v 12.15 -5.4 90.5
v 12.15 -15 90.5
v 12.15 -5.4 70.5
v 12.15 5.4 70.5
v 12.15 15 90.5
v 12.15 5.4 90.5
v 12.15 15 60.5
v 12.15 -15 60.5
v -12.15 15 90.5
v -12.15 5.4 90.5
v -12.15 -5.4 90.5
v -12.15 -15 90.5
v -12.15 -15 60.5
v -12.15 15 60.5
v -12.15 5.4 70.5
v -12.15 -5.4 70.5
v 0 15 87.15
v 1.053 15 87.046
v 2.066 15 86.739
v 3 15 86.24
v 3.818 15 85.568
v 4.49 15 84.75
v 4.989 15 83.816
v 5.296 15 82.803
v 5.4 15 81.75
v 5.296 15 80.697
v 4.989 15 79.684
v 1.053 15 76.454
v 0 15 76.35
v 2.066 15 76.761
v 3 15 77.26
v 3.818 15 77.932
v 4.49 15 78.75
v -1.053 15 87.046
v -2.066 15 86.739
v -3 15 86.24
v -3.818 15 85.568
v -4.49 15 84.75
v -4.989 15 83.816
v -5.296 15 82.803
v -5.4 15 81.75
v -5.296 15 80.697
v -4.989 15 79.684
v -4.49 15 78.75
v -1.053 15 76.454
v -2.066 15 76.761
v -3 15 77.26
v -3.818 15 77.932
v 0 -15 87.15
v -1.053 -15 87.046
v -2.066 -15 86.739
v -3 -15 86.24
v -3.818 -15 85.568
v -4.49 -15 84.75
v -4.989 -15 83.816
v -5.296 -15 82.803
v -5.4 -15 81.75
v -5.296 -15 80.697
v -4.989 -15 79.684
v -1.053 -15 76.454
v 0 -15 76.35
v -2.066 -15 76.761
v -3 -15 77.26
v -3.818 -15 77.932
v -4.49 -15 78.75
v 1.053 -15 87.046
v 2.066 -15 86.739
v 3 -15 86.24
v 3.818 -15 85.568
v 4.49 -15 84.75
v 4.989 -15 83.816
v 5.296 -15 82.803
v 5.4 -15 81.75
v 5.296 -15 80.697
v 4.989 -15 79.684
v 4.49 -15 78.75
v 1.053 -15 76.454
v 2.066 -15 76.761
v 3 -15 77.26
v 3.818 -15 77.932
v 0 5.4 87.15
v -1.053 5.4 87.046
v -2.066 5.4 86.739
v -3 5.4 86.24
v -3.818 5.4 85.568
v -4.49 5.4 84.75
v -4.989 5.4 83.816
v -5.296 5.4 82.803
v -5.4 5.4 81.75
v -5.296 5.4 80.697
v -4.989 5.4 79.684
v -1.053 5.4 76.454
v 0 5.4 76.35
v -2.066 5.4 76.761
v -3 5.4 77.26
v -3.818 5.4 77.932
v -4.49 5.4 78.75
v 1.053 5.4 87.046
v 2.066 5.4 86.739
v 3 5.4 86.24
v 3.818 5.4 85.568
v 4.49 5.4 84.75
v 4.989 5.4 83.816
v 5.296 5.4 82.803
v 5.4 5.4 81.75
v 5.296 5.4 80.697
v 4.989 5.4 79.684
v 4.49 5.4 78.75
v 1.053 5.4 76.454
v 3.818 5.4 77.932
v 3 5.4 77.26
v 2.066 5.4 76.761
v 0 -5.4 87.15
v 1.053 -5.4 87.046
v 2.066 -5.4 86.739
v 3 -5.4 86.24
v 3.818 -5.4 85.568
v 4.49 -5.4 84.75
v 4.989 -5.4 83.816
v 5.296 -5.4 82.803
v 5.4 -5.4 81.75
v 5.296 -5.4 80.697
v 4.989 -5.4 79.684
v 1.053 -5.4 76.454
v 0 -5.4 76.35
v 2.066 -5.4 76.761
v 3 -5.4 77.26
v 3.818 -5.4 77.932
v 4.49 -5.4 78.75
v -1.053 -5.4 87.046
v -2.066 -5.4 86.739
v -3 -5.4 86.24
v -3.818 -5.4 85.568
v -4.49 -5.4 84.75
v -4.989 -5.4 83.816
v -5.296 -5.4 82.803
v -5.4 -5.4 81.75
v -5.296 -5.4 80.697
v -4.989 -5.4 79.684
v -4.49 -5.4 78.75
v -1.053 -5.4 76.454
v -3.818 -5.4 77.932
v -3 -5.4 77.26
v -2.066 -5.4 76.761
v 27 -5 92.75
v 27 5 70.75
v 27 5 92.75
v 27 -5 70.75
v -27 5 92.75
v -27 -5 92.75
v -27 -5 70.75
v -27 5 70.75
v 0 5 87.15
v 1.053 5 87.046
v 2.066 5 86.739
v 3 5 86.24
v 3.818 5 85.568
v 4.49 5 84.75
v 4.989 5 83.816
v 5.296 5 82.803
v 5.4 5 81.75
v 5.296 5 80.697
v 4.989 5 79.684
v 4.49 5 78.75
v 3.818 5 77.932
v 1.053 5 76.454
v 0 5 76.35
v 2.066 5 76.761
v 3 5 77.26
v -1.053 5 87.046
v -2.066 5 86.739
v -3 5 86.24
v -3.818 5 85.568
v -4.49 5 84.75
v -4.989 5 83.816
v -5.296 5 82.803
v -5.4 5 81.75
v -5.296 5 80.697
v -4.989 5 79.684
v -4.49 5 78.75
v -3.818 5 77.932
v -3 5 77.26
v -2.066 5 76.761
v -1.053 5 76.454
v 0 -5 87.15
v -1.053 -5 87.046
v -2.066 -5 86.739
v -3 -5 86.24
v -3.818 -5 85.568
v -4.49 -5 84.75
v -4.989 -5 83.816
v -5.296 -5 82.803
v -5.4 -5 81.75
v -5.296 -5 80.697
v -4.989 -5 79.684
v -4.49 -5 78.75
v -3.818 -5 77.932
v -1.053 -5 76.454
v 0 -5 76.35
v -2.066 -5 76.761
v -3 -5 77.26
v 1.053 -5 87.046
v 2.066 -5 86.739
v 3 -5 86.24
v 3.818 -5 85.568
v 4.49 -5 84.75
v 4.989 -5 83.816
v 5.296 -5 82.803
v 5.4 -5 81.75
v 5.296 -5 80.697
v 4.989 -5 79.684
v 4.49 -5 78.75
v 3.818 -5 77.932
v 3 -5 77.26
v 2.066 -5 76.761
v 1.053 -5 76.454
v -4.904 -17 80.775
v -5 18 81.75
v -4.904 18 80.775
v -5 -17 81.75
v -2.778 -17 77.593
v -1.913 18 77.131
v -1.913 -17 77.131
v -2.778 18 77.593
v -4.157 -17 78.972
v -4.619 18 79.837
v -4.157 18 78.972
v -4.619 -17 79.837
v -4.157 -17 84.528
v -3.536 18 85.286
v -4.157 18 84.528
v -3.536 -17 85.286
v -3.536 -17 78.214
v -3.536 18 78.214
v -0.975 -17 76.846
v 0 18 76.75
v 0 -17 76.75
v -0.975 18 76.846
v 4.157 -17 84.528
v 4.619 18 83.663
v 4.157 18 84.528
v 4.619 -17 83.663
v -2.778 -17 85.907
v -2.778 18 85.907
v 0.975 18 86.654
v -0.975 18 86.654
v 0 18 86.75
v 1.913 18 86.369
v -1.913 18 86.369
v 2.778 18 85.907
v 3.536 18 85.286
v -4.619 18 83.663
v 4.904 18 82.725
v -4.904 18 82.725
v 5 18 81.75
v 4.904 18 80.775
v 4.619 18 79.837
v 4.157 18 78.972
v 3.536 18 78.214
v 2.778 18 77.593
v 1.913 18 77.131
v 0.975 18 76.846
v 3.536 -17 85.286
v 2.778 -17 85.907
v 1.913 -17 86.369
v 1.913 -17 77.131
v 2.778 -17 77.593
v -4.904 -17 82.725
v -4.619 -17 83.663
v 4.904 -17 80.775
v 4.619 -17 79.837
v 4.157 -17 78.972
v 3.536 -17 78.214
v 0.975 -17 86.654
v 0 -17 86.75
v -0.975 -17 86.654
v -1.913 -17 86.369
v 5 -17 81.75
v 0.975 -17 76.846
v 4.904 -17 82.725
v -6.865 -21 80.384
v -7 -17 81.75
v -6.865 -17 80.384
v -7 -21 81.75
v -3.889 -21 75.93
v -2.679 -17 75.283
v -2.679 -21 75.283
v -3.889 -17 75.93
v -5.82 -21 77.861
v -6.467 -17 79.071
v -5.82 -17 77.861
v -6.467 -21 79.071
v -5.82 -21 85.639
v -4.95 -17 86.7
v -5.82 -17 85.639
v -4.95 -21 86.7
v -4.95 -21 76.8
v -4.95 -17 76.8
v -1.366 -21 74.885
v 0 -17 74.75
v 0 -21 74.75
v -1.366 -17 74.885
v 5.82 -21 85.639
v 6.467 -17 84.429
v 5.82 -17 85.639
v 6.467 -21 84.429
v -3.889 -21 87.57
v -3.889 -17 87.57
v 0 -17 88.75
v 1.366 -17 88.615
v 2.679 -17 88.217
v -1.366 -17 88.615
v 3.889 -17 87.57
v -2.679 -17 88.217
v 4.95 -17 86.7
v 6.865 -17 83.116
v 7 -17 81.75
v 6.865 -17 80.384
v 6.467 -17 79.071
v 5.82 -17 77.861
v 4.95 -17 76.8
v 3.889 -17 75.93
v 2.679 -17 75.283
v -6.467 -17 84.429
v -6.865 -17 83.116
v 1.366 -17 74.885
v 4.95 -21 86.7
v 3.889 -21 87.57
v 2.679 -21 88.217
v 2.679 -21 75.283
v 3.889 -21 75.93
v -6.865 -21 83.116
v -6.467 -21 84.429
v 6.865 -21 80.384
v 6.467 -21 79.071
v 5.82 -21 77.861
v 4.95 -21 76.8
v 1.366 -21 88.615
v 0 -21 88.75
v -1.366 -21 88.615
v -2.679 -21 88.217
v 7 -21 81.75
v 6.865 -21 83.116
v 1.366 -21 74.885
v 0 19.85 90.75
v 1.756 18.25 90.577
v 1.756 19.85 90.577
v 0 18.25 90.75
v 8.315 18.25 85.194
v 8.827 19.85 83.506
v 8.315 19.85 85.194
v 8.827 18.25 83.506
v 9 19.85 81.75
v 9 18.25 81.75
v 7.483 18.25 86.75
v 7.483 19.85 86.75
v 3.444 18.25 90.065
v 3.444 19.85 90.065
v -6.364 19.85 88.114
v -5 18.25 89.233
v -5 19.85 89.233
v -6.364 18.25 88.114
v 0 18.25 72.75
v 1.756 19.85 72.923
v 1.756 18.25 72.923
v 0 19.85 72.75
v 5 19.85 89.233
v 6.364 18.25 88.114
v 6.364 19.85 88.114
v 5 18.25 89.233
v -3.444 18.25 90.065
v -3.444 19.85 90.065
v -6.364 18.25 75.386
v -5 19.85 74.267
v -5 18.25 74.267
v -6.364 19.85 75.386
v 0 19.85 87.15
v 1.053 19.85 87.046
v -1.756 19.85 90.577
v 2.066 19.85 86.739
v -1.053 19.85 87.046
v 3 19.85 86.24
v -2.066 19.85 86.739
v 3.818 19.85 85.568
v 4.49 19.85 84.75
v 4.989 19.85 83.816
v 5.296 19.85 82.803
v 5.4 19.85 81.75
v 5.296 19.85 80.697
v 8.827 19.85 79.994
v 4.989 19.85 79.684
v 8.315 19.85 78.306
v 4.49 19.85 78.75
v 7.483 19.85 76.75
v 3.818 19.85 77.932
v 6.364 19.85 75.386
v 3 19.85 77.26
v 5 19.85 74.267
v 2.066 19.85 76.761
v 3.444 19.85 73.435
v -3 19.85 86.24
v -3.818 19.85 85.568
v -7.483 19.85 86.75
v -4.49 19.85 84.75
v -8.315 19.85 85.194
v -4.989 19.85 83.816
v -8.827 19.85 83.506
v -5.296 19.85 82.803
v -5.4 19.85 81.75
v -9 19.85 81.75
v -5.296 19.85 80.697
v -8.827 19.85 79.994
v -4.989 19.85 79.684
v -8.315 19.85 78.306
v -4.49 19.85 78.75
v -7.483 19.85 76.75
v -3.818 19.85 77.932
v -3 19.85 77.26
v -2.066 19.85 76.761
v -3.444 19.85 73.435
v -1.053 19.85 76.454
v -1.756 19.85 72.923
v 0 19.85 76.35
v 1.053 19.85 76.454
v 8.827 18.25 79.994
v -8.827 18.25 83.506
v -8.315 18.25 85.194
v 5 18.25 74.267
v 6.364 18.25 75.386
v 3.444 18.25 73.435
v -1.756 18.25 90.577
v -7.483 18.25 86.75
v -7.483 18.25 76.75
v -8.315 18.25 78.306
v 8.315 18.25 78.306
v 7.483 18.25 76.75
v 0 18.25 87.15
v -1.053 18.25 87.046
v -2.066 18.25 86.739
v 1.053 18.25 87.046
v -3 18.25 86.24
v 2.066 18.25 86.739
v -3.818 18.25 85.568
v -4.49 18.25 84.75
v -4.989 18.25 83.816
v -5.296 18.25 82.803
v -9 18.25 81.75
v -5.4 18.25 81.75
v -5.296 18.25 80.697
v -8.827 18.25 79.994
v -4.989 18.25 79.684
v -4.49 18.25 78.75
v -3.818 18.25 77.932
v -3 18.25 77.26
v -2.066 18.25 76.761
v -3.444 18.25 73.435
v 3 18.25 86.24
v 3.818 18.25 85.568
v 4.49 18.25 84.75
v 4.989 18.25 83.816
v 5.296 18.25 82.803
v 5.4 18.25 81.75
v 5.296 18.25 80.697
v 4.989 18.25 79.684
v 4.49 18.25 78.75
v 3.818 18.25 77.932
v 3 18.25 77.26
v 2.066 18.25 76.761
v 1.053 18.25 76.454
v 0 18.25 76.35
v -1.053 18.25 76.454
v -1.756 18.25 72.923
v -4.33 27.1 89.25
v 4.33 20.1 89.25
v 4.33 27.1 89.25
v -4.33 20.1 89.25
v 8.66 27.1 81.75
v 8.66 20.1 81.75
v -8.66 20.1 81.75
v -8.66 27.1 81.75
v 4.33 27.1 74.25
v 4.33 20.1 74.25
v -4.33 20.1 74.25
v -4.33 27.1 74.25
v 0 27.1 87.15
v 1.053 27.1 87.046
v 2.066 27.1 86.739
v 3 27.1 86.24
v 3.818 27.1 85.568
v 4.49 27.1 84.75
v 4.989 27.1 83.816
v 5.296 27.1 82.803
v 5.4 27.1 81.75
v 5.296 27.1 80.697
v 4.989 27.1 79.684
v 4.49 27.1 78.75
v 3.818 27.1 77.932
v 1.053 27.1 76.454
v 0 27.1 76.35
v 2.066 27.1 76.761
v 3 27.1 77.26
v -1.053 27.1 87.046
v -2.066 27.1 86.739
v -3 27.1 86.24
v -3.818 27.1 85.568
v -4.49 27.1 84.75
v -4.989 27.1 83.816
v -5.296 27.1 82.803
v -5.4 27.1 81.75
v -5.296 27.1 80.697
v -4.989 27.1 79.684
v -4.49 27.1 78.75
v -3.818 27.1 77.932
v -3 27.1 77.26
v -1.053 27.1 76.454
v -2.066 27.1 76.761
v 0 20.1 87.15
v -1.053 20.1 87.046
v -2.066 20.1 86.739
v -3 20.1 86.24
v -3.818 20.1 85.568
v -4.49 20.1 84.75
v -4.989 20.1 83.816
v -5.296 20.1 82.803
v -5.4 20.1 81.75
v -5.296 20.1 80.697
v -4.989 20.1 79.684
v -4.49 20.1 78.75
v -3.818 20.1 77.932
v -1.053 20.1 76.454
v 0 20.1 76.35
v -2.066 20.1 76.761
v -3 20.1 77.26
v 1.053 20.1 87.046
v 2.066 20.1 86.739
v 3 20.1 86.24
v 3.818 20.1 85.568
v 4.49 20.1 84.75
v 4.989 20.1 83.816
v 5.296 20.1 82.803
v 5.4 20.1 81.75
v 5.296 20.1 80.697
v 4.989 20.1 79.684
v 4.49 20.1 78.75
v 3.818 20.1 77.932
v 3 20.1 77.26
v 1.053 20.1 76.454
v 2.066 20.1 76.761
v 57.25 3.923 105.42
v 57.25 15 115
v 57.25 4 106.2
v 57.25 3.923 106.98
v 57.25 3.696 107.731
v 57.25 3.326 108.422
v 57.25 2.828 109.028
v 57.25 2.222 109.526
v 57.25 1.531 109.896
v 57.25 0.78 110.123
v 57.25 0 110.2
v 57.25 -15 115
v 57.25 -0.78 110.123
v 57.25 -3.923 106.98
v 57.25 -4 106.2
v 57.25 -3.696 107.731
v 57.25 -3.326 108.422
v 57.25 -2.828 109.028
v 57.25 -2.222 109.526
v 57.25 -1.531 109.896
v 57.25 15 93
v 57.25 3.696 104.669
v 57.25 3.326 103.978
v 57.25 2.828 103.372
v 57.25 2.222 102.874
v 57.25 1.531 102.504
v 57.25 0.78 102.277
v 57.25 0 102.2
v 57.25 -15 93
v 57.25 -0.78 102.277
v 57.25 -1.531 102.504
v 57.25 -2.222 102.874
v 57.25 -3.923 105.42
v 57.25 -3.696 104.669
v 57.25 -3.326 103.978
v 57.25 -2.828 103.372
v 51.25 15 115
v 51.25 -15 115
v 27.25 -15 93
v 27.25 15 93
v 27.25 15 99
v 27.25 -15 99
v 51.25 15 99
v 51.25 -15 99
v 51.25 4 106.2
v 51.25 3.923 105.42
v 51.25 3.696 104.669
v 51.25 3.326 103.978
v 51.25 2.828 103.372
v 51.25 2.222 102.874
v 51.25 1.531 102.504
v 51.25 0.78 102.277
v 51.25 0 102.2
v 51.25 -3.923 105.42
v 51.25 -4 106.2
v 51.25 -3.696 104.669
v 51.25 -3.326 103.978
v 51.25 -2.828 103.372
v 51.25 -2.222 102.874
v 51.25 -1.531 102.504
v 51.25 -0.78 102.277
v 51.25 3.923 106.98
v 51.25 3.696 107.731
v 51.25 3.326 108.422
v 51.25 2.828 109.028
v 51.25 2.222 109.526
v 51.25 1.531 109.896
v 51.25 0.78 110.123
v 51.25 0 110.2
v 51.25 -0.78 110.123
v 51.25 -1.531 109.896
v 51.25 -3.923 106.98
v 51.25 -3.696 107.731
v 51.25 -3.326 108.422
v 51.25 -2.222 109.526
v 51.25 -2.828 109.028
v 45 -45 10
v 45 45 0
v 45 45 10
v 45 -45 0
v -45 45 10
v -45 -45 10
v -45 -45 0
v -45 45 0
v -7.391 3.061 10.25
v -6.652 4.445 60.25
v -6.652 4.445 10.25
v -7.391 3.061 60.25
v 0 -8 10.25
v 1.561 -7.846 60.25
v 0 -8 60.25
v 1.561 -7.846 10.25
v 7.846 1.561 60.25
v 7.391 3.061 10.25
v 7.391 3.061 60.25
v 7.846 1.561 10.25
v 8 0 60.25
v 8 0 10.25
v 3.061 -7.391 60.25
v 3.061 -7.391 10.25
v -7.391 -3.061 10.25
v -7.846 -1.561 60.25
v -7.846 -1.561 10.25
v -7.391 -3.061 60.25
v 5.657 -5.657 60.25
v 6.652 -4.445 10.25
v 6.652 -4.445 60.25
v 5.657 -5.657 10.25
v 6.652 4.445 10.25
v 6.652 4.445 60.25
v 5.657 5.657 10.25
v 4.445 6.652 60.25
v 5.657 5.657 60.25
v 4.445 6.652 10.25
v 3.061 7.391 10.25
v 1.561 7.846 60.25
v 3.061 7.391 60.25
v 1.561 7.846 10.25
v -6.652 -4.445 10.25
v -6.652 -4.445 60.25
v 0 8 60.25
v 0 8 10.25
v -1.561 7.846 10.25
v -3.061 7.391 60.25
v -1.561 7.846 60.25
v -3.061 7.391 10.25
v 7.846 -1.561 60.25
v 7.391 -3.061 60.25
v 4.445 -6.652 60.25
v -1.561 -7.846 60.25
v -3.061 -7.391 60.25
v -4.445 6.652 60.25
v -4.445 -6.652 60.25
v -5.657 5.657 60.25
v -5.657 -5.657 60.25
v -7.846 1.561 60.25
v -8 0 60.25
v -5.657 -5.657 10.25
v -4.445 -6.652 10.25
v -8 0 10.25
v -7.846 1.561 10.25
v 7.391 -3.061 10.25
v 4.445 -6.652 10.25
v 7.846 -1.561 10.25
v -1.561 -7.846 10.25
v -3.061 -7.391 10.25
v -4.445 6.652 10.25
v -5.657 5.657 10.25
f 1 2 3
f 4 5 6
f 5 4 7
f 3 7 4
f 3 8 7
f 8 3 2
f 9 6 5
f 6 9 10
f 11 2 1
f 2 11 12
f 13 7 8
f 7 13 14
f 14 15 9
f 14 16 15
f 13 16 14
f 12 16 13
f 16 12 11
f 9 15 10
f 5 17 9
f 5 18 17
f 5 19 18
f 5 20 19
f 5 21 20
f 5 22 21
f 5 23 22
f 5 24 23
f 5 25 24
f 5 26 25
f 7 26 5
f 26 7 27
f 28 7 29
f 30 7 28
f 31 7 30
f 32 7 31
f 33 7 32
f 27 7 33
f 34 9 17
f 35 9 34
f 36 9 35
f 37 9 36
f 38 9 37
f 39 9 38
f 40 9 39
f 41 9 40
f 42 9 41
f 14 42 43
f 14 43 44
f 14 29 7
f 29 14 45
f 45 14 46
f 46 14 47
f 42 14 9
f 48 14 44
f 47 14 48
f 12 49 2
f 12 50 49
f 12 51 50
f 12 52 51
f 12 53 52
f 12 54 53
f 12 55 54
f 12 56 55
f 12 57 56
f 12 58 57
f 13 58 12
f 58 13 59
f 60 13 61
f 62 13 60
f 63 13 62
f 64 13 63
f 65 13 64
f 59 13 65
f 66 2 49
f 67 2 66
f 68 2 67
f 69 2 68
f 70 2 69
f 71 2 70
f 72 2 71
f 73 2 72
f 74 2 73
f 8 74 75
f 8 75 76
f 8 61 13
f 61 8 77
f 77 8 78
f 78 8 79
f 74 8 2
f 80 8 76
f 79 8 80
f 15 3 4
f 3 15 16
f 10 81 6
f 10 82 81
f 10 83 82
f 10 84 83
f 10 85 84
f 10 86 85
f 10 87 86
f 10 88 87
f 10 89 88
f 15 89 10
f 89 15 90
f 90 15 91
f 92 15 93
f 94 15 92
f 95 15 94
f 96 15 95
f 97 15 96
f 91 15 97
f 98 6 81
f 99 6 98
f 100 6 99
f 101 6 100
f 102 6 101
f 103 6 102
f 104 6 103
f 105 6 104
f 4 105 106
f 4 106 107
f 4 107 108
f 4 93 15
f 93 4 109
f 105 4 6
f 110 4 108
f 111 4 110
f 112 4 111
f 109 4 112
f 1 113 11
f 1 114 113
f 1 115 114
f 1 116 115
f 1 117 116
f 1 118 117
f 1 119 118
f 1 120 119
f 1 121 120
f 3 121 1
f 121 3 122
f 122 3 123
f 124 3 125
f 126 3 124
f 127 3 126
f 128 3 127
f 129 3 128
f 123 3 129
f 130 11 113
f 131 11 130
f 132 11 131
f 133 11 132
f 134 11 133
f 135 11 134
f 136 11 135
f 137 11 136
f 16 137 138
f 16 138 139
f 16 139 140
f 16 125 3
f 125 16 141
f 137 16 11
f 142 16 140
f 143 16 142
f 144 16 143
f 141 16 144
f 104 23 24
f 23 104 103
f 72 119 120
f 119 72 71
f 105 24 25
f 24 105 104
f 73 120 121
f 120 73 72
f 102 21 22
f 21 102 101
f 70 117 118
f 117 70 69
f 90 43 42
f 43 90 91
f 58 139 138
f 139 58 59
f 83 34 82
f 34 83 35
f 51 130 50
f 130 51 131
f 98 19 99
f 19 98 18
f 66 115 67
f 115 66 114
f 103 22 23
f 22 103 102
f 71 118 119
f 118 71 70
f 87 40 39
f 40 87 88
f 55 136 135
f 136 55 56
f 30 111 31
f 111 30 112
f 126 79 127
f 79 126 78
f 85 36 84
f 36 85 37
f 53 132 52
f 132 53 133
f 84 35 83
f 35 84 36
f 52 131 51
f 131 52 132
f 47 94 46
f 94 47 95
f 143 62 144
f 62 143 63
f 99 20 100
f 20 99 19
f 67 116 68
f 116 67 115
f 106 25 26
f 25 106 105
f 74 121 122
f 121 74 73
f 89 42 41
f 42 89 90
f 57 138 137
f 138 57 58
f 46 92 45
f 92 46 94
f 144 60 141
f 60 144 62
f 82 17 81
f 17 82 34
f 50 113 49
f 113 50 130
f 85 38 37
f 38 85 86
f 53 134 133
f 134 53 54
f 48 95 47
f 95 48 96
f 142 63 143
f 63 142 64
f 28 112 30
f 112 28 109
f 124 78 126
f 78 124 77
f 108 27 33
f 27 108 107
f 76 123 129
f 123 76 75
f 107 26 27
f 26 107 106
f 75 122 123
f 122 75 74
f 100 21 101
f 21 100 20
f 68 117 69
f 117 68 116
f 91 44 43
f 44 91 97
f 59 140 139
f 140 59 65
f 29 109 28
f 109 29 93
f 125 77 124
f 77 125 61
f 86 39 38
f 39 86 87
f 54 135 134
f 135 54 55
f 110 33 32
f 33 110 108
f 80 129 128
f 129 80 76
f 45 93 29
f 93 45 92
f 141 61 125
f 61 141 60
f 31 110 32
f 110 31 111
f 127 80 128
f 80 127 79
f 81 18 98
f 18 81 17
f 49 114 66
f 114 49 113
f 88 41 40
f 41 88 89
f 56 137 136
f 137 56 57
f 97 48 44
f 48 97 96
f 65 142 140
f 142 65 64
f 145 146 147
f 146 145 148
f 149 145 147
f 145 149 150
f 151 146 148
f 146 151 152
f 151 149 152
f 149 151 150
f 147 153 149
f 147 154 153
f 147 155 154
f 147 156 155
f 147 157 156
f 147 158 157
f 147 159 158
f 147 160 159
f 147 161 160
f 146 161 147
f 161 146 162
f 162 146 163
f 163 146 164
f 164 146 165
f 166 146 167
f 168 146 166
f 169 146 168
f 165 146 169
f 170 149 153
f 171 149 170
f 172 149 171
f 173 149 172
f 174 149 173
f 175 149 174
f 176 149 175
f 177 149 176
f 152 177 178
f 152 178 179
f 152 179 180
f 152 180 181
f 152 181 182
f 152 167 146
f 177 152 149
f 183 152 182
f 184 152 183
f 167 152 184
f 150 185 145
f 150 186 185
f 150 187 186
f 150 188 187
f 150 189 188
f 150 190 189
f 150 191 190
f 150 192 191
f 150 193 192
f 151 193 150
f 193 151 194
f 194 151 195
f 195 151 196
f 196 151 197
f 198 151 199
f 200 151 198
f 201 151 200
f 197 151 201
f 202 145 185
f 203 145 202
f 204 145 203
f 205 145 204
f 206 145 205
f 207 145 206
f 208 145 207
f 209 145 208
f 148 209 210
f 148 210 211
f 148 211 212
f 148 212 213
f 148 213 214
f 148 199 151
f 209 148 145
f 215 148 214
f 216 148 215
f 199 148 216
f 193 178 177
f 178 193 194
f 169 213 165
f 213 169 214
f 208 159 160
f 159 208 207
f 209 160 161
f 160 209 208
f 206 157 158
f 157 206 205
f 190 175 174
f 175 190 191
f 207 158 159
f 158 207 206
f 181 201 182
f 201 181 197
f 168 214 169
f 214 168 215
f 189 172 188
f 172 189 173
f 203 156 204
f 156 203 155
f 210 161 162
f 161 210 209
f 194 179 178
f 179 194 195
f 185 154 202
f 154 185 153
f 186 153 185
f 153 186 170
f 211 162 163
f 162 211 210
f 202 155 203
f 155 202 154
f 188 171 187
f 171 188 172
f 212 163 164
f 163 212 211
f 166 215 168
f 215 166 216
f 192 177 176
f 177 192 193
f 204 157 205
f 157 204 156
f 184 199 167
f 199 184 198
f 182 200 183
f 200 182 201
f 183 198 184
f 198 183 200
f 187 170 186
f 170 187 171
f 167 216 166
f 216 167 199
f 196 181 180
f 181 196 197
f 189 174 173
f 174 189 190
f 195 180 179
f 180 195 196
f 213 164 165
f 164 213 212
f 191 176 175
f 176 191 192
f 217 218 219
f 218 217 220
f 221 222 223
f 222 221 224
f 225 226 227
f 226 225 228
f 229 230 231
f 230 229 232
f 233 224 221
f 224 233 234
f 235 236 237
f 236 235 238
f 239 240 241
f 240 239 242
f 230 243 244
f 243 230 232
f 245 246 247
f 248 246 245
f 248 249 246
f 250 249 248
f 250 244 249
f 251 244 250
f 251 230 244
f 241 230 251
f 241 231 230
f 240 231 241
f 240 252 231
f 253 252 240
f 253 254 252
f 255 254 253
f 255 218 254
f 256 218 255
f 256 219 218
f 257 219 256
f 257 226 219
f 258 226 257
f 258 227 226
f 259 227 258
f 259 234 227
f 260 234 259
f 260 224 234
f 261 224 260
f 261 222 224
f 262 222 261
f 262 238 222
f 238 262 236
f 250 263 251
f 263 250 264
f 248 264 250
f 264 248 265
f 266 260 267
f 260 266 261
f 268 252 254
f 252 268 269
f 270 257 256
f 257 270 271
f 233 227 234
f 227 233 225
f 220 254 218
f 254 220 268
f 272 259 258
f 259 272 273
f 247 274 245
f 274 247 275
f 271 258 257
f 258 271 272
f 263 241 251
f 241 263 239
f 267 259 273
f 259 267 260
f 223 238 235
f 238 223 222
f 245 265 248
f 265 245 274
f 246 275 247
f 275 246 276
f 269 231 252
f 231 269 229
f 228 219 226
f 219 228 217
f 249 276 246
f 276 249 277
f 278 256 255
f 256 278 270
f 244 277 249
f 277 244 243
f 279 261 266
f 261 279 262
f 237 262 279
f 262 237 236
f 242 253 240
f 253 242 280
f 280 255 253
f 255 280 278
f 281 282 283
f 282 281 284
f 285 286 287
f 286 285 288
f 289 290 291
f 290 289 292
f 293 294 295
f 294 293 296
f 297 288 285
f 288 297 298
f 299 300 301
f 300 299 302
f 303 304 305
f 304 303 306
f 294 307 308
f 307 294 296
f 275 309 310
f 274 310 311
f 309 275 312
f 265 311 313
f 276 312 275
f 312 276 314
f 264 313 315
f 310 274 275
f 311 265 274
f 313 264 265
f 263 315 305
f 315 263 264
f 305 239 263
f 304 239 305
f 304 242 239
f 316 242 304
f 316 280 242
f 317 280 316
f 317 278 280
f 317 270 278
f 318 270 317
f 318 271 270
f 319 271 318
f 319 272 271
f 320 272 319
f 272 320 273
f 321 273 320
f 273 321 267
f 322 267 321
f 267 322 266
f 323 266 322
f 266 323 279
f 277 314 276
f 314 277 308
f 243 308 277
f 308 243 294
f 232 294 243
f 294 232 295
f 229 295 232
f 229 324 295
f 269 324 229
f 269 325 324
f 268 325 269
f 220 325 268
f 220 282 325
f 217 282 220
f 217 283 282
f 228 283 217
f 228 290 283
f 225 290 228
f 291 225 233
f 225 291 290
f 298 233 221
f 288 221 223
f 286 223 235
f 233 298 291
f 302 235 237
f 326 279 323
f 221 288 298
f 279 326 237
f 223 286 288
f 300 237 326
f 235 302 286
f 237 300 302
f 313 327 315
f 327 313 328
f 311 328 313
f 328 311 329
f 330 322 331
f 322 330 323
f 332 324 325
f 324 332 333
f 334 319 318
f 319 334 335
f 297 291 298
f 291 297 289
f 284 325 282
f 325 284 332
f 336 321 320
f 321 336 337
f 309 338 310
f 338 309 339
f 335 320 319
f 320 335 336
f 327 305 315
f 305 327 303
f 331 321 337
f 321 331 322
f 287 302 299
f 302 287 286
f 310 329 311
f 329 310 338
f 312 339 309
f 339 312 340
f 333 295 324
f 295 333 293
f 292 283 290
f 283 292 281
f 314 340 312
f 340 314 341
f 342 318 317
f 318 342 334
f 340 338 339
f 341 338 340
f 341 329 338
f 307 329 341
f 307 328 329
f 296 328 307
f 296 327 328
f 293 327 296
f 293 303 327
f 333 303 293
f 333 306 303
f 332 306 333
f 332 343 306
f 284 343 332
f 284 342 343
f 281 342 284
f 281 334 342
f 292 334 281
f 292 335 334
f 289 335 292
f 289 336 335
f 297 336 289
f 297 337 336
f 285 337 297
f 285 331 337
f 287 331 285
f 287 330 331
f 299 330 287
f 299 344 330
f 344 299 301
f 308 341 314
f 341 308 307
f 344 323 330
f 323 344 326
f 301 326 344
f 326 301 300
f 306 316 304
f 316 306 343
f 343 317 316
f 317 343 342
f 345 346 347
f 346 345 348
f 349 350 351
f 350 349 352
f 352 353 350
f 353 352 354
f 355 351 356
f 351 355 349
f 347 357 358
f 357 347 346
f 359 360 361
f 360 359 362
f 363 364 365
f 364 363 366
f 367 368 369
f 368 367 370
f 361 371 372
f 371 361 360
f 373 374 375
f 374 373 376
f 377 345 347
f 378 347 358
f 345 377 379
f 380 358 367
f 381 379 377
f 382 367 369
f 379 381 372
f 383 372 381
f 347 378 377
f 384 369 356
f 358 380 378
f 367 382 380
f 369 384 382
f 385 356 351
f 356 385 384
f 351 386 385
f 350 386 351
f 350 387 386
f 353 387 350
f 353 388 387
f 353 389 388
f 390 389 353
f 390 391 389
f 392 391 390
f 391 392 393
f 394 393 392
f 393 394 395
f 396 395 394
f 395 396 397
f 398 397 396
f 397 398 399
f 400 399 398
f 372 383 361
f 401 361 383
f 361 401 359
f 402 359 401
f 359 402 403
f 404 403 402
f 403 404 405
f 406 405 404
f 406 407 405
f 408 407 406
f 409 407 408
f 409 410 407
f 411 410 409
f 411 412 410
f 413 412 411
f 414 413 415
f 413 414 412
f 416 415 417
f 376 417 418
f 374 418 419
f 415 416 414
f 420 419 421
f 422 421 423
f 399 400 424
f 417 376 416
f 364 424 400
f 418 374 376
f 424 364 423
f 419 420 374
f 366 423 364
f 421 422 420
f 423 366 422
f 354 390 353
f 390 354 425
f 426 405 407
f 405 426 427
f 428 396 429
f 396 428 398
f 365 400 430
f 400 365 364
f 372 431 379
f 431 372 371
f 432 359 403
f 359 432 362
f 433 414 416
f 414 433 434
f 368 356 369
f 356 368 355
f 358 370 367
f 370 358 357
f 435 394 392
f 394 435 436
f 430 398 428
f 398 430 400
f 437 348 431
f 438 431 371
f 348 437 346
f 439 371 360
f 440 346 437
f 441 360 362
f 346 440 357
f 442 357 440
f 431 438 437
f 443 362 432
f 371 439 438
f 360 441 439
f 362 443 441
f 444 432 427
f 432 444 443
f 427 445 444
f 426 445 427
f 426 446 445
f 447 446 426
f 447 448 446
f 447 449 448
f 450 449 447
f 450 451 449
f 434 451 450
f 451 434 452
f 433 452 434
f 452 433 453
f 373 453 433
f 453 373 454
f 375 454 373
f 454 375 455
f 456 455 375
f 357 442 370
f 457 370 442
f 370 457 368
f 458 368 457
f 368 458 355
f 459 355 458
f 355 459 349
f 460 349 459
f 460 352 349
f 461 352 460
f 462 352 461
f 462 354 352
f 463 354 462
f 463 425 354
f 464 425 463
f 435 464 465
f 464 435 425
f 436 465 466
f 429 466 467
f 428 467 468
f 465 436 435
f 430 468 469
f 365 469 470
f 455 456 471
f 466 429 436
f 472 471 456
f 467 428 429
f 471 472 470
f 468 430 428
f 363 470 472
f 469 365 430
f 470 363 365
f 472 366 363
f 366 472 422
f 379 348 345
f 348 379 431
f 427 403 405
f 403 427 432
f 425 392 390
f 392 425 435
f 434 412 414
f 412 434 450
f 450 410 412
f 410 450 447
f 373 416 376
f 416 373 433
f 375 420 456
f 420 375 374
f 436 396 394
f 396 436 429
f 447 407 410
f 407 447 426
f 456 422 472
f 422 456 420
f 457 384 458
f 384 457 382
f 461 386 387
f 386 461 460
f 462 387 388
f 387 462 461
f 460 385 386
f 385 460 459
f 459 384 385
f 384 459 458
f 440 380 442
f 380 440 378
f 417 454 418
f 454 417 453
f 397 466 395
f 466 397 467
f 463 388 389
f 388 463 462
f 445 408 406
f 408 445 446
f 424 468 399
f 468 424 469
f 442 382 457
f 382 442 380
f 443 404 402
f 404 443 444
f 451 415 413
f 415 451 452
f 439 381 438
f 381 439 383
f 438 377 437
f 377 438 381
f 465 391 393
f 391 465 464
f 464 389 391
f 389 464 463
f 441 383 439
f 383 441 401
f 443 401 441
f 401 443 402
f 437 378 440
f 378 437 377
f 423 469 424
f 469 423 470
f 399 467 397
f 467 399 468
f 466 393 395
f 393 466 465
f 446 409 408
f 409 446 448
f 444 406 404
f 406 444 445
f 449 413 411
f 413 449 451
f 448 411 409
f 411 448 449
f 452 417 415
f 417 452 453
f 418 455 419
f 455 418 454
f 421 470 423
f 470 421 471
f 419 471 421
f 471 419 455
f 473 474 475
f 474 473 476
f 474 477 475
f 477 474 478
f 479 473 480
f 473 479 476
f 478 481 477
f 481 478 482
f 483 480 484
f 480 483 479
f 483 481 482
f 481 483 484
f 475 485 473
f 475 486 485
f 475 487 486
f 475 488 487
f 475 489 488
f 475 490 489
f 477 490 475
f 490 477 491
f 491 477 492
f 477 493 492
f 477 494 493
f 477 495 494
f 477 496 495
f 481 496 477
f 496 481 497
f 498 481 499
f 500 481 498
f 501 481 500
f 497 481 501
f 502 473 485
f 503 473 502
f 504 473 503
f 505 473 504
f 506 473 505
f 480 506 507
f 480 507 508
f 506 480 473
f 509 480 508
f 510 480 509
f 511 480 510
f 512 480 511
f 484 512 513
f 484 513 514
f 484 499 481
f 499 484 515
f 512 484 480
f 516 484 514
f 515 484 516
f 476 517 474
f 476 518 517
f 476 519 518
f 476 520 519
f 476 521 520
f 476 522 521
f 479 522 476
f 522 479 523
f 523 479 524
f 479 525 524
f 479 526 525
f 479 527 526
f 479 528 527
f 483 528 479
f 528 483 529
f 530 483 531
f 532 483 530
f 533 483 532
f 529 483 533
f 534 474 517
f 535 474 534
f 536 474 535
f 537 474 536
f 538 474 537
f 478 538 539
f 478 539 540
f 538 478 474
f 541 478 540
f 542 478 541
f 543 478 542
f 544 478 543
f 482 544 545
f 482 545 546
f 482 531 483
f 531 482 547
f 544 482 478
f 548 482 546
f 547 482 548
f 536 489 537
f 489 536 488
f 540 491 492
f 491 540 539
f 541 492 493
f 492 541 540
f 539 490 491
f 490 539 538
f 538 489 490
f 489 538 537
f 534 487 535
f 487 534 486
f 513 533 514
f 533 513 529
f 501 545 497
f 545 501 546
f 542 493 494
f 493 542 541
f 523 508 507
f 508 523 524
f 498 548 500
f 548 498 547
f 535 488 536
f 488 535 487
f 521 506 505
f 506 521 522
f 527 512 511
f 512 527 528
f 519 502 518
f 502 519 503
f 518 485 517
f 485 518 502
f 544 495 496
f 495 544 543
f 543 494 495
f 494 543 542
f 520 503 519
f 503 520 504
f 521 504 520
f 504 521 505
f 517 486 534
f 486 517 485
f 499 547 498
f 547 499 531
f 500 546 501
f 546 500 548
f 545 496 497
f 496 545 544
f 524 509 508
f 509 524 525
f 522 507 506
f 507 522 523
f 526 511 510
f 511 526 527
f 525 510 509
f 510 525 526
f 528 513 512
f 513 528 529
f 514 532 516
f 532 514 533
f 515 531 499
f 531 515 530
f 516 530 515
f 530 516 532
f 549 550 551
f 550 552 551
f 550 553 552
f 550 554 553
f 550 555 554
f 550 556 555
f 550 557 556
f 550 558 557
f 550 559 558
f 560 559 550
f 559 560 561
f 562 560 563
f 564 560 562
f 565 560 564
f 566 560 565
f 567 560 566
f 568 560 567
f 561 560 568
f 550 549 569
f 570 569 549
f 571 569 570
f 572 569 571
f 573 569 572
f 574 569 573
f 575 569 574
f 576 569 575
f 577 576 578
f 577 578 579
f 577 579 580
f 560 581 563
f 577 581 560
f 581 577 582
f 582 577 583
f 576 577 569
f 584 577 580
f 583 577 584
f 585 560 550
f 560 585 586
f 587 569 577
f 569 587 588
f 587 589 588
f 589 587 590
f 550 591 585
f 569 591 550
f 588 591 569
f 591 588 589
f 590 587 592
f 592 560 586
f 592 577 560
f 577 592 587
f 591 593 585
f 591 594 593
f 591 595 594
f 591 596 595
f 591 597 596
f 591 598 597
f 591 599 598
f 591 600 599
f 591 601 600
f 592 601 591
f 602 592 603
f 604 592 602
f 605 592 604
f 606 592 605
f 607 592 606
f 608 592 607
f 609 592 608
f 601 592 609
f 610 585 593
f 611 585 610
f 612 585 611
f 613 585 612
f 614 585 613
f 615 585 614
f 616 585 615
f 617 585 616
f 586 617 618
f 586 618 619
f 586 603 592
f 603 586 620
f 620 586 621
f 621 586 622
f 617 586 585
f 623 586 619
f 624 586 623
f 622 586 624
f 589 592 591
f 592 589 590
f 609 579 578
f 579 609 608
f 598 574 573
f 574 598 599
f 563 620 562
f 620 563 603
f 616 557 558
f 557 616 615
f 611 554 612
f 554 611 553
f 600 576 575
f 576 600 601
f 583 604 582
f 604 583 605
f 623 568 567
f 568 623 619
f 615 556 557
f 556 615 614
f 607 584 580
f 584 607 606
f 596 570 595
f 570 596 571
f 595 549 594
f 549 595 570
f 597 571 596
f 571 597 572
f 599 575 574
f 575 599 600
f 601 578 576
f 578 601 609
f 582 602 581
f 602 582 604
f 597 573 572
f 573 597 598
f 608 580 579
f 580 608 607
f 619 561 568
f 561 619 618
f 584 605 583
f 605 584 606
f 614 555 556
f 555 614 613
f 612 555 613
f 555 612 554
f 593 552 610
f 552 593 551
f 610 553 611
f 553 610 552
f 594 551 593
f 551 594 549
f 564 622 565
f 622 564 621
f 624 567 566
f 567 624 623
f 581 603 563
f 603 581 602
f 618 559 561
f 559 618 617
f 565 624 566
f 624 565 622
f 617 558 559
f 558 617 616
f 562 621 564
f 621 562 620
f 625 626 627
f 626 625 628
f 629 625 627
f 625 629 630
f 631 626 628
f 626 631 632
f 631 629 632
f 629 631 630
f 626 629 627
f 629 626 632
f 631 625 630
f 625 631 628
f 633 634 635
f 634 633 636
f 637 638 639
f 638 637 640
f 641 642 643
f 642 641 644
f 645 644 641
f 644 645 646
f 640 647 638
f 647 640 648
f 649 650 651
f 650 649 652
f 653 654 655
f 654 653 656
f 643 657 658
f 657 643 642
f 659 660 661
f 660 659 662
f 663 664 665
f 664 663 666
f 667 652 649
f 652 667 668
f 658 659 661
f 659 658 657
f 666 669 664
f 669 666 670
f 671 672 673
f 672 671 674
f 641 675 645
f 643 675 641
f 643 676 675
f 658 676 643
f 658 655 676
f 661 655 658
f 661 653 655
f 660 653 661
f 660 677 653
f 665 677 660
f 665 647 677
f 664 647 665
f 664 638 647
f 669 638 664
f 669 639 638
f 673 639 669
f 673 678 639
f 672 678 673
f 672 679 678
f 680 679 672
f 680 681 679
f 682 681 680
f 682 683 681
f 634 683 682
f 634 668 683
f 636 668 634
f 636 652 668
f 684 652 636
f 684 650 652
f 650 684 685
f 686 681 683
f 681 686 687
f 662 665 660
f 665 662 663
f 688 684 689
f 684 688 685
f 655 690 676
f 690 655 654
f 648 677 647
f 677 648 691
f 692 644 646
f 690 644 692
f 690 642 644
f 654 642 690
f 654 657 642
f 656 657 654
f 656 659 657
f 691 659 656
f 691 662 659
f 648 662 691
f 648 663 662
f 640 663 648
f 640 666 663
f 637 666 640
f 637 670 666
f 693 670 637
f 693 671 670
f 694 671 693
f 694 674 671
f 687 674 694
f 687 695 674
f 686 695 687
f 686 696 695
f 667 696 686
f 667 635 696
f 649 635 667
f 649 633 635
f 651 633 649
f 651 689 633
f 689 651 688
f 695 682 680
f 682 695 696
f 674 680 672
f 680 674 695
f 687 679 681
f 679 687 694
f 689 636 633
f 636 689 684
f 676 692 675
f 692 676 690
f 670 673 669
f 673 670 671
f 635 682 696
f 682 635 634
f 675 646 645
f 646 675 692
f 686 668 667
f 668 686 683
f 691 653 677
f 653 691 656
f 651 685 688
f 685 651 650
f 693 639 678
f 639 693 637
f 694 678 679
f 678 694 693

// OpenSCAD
$fn = 32;

// ------------------------------------------------------------------------
// Lamp arm: column d16 x 50 mm, arm 54 mm
// Every part is its own module, assembly() places every instance.
// ------------------------------------------------------------------------

// --- part 1 ---
module lamp_base() {
  difference() {
    translate([-45, -45, 0]) cube([90, 90, 10]);
  }
}

// --- part 2 ---
module lamp_column() {
  cylinder(h = 50, d = 16);
}

// --- part 3 ---
module head_fork() {
  difference() {
    translate([-12.15, -15, 0]) cube([24.3, 30, 30]);
    translate([-13.15, -5.4, 10]) cube([26.3, 10.8, 21]);
    translate([0, 0, 21.25]) rotate([90, 0, 0]) cylinder(h = 32, d = 10.8, center = true);
  }
}

// --- part 4 ---
module lamp_arm() {
  difference() {
    translate([-27, -5, 0]) cube([54, 10, 22]);
    translate([0, 0, 11]) rotate([90, 0, 0]) cylinder(h = 12, d = 10.8, center = true);
  }
}

// --- part 5 ---
module arm_pin() {
  rotate([0, 90, 0]) cylinder(h = 36, d = 10, center = true);
  translate([-21, 0, 0]) rotate([0, 90, 0]) cylinder(h = 4, d = 14);
}

// --- part 6 ---
module arm_washer() {
  difference() {
      translate([0, 0, 0]) cylinder(h = 1.6, d = 18);
      translate([0, 0, -1]) cylinder(h = 3.6, d = 10.8);
    }
}

// --- part 7 ---
module arm_nut() {
  difference() {
    linear_extrude(height = 7) polygon(points = [[8.66, 0], [4.33, 7.5], [-4.33, 7.5], [-8.66, 0], [-4.33, -7.5], [4.33, -7.5]]);
    translate([0, 0, -1]) cylinder(h = 9, d = 10.8);
  }
}

// --- part 8 ---
module shade_bracket() {
  difference() {
    translate([-15, -15, 0]) cube([30, 30, 22]);
    translate([-16, -16, 6]) cube([25, 32, 17]);
    translate([12, 0, 13.2]) rotate([0, 90, 0]) cylinder(h = 8, d = 8, center = true);
  }
}

// --- assembly ---
module assembly() {
  color([0.80, 0.24, 0.20]) translate([0, 0, 0]) rotate([0, 0, 0]) lamp_base();
  color([0.20, 0.45, 0.75]) translate([0, 0, 10.25]) rotate([0, 0, 0]) lamp_column();
  color([0.25, 0.62, 0.32]) translate([0, 0, 60.5]) rotate([0, 0, 0]) head_fork();
  color([0.92, 0.70, 0.18]) translate([0, 0, 70.75]) rotate([0, 0, 0]) lamp_arm();
  color([0.58, 0.35, 0.70]) translate([0, 0, 81.75]) rotate([0, 0, 90]) arm_pin();
  color([0.16, 0.66, 0.66]) translate([0, 19.85, 81.75]) rotate([90, 0, 0]) arm_washer();
  color([0.85, 0.48, 0.18]) translate([0, 27.1, 81.75]) rotate([90, 0, 0]) arm_nut();
  color([0.55, 0.60, 0.65]) translate([42.25, 0, 93]) rotate([0, 0, 0]) shade_bracket();
}

assembly();
